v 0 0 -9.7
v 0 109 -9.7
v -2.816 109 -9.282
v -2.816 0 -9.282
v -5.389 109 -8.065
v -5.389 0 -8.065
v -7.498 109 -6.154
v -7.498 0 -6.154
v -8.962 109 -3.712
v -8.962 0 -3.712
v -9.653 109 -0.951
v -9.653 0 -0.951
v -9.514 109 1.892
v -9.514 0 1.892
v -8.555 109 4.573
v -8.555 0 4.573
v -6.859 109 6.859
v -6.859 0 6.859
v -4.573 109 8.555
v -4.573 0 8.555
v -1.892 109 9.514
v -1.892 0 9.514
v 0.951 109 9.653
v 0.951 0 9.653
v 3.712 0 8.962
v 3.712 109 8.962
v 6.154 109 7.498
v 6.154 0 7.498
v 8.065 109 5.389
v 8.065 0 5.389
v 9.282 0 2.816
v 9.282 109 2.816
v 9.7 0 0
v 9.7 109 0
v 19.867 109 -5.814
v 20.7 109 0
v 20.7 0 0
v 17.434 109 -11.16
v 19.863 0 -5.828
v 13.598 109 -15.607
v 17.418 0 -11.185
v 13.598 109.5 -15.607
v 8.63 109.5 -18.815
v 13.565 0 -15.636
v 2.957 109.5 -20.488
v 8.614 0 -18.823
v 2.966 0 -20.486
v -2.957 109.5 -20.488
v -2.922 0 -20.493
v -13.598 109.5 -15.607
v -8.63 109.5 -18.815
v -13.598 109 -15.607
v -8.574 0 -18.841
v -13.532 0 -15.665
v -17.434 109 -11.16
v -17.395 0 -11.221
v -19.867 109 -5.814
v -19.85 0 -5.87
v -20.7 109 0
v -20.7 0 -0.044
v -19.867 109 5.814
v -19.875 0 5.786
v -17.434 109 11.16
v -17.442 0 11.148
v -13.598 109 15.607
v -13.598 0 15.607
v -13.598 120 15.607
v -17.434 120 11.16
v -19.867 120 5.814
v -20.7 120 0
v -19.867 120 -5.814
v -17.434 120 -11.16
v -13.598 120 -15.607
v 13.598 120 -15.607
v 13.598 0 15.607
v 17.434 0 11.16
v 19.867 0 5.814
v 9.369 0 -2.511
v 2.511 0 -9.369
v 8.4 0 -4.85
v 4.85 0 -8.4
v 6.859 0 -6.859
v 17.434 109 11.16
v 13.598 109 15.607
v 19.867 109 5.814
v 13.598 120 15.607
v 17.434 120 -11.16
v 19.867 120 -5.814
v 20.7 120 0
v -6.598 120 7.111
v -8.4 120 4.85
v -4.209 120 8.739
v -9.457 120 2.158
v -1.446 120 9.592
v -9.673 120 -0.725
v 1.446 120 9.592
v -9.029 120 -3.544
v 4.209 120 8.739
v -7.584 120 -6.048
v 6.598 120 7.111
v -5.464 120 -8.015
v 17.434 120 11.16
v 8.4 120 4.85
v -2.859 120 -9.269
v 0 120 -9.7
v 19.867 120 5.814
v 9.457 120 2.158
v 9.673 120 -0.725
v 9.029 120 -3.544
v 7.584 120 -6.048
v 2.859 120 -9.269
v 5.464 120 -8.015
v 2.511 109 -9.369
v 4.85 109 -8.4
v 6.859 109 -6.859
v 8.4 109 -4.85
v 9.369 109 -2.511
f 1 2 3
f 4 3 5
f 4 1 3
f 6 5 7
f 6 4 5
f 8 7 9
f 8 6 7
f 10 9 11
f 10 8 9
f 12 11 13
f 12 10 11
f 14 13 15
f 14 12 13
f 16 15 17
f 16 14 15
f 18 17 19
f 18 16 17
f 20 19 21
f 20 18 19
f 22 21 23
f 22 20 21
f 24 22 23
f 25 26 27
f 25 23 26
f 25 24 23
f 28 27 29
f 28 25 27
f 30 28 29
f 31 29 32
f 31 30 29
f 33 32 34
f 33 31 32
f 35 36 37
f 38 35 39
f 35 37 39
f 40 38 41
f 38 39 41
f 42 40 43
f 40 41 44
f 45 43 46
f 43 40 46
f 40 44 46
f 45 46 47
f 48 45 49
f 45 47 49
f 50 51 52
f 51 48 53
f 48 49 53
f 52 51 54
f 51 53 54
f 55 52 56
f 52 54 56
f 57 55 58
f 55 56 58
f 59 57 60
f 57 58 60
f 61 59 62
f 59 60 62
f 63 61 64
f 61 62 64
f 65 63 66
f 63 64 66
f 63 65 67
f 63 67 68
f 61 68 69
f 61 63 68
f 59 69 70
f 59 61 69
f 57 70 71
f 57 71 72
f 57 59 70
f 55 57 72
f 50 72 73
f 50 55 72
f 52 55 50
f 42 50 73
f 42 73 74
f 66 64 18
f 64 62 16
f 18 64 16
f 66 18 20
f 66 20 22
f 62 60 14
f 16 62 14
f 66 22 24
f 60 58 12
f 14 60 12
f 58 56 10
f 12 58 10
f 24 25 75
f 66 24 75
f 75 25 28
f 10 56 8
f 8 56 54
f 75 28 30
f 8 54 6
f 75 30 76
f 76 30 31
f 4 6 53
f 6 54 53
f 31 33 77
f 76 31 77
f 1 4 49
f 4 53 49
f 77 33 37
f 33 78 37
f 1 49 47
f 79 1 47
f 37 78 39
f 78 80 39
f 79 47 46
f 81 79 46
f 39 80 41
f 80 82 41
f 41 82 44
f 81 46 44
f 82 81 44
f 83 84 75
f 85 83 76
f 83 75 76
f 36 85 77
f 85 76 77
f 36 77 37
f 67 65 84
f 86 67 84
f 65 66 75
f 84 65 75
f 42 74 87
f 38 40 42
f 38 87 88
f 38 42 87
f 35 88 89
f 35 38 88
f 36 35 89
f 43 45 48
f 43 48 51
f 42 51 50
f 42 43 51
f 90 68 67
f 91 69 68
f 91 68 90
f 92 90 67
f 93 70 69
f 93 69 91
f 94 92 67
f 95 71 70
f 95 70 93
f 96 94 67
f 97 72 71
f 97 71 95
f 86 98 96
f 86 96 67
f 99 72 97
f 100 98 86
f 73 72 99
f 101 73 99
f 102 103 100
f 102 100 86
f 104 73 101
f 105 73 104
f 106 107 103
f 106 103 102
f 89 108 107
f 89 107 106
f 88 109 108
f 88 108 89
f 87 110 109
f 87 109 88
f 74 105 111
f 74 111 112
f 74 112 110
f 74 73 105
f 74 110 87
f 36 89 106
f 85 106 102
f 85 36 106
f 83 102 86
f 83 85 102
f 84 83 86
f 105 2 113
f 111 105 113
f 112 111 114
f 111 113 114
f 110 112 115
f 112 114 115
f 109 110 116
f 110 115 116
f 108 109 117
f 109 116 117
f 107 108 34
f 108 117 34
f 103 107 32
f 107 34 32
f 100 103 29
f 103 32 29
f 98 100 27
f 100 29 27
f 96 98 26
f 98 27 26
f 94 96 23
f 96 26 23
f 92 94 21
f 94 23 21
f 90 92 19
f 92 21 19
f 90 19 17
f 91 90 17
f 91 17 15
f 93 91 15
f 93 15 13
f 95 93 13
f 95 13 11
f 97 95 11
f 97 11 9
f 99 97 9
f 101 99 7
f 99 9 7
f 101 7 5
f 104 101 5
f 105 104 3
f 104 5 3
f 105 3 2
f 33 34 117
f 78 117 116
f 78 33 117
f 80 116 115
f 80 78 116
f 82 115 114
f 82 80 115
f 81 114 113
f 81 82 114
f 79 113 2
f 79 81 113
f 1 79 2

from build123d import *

# Parameters (mm, degrees)
SKETCH_1_R             = 20.7
SKETCH_1_R_2           = 9.7
EXTRUDE_1_DEPTH        = 109.5
EXTRUDE_1_2_DEPTH      = 10
EXTRUDE_1_2_DEPTH_BACK = 1
SKETCH_2_W             = 45.579766756
SKETCH_2_H             = 31.21486686
SKETCH_3_R             = 9.7
CUT_EXTRUDE_1_DEPTH    = 124.886515749
SKETCH_4_W             = 48.064833826
SKETCH_4_H             = 7.030921468
CUT_EXTRUDE_2_DEPTH    = 114.745851724
SKETCH_5_R             = 31.7
SKETCH_5_R_2           = 20.7
CUT_EXTRUDE_1_2_DEPTH  = 124.886515749


with BuildPart() as part:
    # 草圖1 → Extrude 1 (new body)
    with BuildSketch(Plane(origin=(0, 0, 0), x_dir=(1, 0, 0), z_dir=(0, 1, 0))):
        Circle(SKETCH_1_R)
        Circle(SKETCH_1_R_2, mode=Mode.SUBTRACT)
    extrude(amount=EXTRUDE_1_DEPTH)

    # 草圖2 → Extrude 1 2 (add, two sides: drawn at the far end of the back side and taken through both)
    with BuildSketch(Plane(origin=(0, 110, 0), x_dir=(1, 0, 0), z_dir=(0, 1, 0)).offset(-EXTRUDE_1_2_DEPTH_BACK)):
        Rectangle(SKETCH_2_W, SKETCH_2_H)
    extrude(amount=EXTRUDE_1_2_DEPTH + EXTRUDE_1_2_DEPTH_BACK)

    # 草圖3 → Cut-Extrude 1 (cut, through all)
    with BuildSketch(Plane.XZ):
        with Locations(Location((0, 0, 0), (0, 0, 270))):
            Circle(SKETCH_3_R)
    extrude(amount=-CUT_EXTRUDE_1_DEPTH, mode=Mode.SUBTRACT)

    # 草圖4 → 除料-伸長2 (cut, through all)
    with BuildSketch(Plane(origin=(0, 109.5, 0), x_dir=(1, 0, 0), z_dir=(0, 1, 0))):
        with Locations((1.242533535, -19.122894164)):
            Rectangle(SKETCH_4_W, SKETCH_4_H)
    extrude(amount=-CUT_EXTRUDE_2_DEPTH, mode=Mode.SUBTRACT)

    # 草圖5 → Cut-Extrude 1 2 (cut, through all)
    with BuildSketch(Plane.XZ):
        Circle(SKETCH_5_R)
        Circle(SKETCH_5_R_2, mode=Mode.SUBTRACT)
    extrude(amount=-CUT_EXTRUDE_1_2_DEPTH, mode=Mode.SUBTRACT)


solid = part.part
